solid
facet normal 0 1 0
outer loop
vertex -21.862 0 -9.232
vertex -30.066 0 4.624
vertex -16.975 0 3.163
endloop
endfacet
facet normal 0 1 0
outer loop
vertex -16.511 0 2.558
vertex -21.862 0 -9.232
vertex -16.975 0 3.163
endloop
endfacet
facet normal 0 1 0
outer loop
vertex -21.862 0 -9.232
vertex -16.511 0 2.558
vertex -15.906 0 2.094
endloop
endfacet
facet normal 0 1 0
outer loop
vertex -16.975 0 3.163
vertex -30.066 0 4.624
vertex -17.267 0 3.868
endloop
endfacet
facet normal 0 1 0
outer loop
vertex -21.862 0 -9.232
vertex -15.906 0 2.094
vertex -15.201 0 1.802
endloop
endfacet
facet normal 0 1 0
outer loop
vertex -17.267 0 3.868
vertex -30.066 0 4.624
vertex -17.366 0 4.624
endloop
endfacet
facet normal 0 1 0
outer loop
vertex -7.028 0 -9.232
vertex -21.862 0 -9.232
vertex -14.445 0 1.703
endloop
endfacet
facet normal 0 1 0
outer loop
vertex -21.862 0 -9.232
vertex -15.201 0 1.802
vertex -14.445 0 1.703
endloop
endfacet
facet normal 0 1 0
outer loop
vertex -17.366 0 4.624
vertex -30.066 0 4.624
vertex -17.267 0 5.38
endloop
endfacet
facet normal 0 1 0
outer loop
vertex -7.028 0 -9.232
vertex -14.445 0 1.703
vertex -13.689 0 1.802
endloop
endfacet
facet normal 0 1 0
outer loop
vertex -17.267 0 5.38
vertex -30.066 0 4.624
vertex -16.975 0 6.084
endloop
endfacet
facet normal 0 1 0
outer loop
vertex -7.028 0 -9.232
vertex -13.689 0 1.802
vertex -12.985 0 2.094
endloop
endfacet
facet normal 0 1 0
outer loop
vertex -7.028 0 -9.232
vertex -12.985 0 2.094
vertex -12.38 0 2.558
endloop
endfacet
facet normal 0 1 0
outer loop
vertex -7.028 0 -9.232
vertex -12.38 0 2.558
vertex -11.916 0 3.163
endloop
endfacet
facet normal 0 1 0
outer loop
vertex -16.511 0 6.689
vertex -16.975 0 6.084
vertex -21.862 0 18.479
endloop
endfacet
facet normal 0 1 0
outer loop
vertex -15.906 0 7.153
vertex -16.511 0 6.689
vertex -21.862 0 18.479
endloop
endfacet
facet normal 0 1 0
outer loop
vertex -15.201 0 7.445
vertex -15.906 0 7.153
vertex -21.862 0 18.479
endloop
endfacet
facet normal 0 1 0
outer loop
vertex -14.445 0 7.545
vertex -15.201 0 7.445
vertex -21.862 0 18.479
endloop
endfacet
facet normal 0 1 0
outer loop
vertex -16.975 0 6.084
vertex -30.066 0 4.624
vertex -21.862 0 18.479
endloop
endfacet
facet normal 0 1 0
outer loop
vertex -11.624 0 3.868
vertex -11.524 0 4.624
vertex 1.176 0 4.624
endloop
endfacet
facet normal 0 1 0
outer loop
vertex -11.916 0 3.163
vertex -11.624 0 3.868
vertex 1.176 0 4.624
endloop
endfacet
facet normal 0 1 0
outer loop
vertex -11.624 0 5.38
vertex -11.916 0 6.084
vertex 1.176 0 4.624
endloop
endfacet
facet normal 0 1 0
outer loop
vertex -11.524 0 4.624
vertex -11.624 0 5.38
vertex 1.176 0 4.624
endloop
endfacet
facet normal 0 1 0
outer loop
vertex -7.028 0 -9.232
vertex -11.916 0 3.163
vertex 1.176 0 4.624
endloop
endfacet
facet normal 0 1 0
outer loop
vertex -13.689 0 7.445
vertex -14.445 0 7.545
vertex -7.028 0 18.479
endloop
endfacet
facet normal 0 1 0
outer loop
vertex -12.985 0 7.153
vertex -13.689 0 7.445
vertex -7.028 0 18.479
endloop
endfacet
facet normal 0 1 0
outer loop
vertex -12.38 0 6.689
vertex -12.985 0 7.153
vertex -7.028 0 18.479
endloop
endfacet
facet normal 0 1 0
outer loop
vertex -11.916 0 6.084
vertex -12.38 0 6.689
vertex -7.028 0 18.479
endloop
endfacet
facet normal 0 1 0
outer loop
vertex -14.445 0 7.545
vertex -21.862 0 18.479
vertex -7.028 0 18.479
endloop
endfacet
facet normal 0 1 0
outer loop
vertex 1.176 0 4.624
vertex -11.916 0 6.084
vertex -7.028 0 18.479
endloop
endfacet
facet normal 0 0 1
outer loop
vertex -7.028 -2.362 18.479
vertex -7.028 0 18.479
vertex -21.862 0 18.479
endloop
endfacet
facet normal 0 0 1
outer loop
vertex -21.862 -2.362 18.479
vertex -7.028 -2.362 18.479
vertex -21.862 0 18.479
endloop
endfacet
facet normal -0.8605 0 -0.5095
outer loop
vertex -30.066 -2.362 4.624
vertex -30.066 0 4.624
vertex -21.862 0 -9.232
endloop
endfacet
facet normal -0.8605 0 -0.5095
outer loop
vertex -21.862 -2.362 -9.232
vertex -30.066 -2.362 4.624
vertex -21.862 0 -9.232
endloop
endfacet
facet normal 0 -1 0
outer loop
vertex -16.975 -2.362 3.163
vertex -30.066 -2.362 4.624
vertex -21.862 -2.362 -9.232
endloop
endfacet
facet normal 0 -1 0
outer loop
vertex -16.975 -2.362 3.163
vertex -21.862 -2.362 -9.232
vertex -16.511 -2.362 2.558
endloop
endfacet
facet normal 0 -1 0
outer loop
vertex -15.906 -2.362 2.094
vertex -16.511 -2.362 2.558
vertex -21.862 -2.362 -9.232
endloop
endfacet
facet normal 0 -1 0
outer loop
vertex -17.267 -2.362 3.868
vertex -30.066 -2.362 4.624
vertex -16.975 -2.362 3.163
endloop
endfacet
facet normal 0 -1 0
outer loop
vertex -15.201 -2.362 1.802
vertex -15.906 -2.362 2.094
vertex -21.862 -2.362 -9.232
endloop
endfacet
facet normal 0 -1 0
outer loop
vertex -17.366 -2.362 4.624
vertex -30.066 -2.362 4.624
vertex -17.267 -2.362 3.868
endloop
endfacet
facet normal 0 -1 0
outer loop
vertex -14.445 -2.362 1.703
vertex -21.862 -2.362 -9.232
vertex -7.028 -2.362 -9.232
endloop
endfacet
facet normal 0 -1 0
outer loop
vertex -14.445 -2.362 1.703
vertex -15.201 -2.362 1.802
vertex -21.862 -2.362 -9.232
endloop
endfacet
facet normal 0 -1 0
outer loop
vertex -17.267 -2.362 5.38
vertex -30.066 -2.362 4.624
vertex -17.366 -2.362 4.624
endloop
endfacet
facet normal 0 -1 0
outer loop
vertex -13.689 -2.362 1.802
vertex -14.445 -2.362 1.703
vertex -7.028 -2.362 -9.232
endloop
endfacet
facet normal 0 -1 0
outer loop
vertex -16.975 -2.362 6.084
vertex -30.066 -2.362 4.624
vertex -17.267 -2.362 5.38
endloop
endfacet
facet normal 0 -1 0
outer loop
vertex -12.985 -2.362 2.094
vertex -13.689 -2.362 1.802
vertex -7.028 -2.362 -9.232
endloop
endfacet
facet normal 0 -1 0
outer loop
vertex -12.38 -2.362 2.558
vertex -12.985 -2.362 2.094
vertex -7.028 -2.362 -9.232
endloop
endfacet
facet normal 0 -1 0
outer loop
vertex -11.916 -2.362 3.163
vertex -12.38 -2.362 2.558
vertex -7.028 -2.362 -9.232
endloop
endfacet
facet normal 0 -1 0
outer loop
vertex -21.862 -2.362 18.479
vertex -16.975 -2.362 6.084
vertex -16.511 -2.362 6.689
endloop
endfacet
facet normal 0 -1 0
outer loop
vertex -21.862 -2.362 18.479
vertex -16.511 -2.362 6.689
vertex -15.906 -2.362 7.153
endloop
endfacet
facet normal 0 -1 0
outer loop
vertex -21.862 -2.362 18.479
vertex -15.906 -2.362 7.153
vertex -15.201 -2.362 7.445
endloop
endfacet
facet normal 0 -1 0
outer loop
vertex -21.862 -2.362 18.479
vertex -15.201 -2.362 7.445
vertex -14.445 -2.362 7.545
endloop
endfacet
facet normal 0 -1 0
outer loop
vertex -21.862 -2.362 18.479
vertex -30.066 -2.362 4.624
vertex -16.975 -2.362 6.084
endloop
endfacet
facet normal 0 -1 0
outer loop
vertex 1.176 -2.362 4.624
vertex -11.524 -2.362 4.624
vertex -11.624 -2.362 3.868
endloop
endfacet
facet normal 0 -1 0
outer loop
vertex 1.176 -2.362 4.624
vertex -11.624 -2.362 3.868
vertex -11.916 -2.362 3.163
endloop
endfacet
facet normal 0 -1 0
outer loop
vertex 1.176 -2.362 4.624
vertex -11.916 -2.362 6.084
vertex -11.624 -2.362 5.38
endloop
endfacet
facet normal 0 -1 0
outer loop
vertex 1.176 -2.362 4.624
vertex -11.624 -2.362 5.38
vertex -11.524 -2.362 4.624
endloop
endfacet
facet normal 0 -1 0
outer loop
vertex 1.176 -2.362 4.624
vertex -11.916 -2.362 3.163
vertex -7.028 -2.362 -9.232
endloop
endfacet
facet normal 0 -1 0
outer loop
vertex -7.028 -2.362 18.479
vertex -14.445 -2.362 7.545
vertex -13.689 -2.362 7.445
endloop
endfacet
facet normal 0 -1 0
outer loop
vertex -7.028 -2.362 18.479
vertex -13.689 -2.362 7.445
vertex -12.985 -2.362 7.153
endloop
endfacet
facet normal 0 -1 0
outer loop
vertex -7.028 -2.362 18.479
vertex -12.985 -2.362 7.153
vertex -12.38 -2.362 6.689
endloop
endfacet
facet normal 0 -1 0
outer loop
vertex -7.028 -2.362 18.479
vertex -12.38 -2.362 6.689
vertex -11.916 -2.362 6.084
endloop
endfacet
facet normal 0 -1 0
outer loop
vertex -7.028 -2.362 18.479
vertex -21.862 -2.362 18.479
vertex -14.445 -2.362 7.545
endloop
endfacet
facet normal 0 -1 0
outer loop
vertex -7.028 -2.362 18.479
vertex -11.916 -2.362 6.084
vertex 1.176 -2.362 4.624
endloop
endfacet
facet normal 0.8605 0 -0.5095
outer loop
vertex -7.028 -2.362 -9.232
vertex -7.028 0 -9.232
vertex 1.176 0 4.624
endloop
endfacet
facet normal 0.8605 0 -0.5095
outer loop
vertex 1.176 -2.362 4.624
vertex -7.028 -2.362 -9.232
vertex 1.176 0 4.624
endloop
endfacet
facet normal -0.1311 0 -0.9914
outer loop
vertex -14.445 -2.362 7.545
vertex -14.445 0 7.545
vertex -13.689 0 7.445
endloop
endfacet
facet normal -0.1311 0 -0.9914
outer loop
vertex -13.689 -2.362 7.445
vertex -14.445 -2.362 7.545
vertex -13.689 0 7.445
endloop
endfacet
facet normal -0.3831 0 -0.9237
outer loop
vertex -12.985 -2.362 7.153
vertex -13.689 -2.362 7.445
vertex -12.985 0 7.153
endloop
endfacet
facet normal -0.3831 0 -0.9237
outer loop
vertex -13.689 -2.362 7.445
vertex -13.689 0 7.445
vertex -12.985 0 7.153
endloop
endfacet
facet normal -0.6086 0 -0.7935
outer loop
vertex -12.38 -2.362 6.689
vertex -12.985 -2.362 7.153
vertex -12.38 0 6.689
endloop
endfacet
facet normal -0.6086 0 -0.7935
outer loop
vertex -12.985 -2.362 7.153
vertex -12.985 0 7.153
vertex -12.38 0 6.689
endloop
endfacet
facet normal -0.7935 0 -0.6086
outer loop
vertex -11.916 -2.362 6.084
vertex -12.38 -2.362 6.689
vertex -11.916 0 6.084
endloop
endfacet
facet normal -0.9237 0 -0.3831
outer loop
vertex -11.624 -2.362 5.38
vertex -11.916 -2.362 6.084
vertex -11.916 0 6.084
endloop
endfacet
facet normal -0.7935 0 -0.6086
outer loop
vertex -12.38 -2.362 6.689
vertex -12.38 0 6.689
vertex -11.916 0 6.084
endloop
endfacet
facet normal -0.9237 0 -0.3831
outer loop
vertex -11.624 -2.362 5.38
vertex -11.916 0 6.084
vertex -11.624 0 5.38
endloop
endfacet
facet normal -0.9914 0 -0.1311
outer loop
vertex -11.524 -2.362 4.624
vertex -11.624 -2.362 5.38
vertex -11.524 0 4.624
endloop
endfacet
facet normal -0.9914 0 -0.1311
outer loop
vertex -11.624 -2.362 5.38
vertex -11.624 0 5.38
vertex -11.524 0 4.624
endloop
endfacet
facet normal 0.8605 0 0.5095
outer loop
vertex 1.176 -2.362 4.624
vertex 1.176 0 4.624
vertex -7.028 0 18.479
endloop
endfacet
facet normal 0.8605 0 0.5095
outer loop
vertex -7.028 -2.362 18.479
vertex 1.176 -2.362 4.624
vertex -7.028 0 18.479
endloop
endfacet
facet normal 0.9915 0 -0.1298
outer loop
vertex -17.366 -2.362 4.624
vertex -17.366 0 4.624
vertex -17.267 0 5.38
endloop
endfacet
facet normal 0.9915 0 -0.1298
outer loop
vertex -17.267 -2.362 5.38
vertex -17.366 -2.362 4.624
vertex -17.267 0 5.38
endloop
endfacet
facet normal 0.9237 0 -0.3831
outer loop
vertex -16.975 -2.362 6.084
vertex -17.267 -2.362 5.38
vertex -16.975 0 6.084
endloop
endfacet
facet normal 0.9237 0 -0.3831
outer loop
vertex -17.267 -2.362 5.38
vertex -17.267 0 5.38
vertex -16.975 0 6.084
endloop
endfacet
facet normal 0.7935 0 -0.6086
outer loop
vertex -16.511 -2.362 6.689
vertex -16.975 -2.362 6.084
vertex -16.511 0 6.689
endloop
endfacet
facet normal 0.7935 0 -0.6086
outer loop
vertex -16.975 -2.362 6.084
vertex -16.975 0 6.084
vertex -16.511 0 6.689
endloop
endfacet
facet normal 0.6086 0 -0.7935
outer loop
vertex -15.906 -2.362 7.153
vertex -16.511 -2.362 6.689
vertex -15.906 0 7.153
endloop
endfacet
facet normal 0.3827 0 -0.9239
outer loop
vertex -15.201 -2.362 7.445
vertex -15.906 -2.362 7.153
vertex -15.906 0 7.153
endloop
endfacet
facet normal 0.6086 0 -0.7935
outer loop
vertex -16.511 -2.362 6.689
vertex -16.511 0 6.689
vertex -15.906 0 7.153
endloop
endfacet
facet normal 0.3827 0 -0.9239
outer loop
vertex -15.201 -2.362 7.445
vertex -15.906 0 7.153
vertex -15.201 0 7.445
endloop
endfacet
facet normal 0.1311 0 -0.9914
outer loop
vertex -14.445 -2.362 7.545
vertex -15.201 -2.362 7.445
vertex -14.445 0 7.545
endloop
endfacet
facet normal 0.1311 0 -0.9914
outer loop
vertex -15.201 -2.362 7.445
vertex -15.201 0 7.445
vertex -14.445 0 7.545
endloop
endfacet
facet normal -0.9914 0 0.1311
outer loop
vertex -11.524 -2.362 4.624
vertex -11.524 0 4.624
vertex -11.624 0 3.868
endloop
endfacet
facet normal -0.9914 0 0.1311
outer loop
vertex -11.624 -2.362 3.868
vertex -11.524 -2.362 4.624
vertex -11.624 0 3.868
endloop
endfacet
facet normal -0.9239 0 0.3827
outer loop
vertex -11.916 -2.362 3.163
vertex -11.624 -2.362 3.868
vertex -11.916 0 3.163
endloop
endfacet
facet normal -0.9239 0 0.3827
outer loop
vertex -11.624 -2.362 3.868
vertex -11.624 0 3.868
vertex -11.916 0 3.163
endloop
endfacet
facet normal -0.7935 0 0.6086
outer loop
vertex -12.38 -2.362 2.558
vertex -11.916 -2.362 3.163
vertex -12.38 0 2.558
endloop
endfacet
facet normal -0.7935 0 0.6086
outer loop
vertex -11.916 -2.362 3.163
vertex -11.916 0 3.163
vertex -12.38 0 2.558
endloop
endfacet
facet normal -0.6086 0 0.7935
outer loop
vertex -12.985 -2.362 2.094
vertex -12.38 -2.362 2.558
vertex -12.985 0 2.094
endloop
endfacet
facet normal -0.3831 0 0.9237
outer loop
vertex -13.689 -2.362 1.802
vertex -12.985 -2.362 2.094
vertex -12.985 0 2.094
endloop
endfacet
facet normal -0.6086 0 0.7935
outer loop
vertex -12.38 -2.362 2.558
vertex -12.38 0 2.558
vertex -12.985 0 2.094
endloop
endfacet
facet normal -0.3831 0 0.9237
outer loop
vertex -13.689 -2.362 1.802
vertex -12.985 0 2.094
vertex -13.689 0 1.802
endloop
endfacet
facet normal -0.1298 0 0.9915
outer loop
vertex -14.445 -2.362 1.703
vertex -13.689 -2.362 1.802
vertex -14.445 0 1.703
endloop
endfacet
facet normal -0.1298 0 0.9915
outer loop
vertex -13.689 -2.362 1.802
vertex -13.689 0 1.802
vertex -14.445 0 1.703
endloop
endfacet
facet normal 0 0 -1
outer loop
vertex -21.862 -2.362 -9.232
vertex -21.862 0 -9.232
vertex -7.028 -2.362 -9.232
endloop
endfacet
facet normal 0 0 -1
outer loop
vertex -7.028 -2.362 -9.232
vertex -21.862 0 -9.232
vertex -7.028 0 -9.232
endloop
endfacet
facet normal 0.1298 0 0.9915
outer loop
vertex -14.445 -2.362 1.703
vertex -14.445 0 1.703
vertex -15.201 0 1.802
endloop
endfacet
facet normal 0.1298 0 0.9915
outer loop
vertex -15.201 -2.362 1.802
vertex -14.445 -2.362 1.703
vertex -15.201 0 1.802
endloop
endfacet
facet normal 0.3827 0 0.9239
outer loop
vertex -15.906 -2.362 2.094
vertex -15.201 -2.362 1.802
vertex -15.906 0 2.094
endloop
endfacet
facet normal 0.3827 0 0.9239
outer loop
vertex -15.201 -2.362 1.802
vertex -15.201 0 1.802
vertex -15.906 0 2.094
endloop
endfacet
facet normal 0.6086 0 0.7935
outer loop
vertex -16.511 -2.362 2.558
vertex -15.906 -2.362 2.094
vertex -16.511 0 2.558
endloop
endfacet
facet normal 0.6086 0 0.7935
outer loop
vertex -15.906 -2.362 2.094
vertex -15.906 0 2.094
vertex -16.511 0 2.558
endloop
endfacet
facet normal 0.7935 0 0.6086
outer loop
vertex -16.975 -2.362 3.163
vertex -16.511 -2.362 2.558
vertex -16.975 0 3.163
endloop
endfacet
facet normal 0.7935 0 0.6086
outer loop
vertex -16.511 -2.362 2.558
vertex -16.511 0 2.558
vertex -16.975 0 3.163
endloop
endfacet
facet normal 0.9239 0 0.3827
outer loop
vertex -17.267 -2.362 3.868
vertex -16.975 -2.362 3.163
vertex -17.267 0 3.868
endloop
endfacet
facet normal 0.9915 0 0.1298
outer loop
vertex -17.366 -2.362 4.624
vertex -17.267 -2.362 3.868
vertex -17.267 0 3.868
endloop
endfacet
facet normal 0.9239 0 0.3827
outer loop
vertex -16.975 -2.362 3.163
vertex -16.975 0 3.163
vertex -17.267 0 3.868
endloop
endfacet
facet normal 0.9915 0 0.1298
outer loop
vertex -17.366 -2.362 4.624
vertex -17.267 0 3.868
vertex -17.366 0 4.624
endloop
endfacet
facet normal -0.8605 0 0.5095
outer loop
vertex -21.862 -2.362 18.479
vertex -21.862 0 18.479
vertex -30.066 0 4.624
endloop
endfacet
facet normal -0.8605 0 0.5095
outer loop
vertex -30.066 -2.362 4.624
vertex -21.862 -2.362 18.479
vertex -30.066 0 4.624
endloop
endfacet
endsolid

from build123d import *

# Parameters (mm, degrees)
F1_DEPTH = 2.3622


with BuildPart() as f1:
    # F0 (on Front) → F1 (new body)
    with BuildSketch(Plane.XZ):
        with BuildLine():
            Line((-21.86199, -9.231923), (-14.44519, -9.231923))
            Line((-14.44519, -9.231923), (-14.44519, 1.702777))
            ThreePointArc((-14.44519, 1.702777), (-16.510649, 2.558318), (-17.36619, 4.623777))
            Line((-17.36619, 4.623777), (-30.06619, 4.623777))
            Line((-30.06619, 4.623777), (-21.86199, -9.231923))
        make_face()
        with BuildLine():
            Line((-14.44519, 1.702777), (-14.44519, -9.231923))
            Line((-14.44519, -9.231923), (-7.02839, -9.231923))
            Line((-7.02839, -9.231923), (1.17581, 4.623777))
            Line((1.17581, 4.623777), (-11.52419, 4.623777))
            ThreePointArc((-11.52419, 4.623777), (-12.379731, 2.558318), (-14.44519, 1.702777))
        make_face()
        with BuildLine():
            Line((-30.06619, 4.623777), (-17.36619, 4.623777))
            ThreePointArc((-17.36619, 4.623777), (-16.510649, 6.689236), (-14.44519, 7.544777))
            Line((-14.44519, 7.544777), (-14.44519, 18.479477))
            Line((-14.44519, 18.479477), (-21.86199, 18.479477))
            Line((-21.86199, 18.479477), (-30.06619, 4.623777))
        make_face()
        with BuildLine():
            ThreePointArc((-14.44519, 7.544777), (-12.379731, 6.689236), (-11.52419, 4.623777))
            Line((-11.52419, 4.623777), (1.17581, 4.623777))
            Line((1.17581, 4.623777), (-7.02839, 18.479477))
            Line((-7.02839, 18.479477), (-14.44519, 18.479477))
            Line((-14.44519, 18.479477), (-14.44519, 7.544777))
        make_face()
    extrude(amount=F1_DEPTH)


solid = f1.part
